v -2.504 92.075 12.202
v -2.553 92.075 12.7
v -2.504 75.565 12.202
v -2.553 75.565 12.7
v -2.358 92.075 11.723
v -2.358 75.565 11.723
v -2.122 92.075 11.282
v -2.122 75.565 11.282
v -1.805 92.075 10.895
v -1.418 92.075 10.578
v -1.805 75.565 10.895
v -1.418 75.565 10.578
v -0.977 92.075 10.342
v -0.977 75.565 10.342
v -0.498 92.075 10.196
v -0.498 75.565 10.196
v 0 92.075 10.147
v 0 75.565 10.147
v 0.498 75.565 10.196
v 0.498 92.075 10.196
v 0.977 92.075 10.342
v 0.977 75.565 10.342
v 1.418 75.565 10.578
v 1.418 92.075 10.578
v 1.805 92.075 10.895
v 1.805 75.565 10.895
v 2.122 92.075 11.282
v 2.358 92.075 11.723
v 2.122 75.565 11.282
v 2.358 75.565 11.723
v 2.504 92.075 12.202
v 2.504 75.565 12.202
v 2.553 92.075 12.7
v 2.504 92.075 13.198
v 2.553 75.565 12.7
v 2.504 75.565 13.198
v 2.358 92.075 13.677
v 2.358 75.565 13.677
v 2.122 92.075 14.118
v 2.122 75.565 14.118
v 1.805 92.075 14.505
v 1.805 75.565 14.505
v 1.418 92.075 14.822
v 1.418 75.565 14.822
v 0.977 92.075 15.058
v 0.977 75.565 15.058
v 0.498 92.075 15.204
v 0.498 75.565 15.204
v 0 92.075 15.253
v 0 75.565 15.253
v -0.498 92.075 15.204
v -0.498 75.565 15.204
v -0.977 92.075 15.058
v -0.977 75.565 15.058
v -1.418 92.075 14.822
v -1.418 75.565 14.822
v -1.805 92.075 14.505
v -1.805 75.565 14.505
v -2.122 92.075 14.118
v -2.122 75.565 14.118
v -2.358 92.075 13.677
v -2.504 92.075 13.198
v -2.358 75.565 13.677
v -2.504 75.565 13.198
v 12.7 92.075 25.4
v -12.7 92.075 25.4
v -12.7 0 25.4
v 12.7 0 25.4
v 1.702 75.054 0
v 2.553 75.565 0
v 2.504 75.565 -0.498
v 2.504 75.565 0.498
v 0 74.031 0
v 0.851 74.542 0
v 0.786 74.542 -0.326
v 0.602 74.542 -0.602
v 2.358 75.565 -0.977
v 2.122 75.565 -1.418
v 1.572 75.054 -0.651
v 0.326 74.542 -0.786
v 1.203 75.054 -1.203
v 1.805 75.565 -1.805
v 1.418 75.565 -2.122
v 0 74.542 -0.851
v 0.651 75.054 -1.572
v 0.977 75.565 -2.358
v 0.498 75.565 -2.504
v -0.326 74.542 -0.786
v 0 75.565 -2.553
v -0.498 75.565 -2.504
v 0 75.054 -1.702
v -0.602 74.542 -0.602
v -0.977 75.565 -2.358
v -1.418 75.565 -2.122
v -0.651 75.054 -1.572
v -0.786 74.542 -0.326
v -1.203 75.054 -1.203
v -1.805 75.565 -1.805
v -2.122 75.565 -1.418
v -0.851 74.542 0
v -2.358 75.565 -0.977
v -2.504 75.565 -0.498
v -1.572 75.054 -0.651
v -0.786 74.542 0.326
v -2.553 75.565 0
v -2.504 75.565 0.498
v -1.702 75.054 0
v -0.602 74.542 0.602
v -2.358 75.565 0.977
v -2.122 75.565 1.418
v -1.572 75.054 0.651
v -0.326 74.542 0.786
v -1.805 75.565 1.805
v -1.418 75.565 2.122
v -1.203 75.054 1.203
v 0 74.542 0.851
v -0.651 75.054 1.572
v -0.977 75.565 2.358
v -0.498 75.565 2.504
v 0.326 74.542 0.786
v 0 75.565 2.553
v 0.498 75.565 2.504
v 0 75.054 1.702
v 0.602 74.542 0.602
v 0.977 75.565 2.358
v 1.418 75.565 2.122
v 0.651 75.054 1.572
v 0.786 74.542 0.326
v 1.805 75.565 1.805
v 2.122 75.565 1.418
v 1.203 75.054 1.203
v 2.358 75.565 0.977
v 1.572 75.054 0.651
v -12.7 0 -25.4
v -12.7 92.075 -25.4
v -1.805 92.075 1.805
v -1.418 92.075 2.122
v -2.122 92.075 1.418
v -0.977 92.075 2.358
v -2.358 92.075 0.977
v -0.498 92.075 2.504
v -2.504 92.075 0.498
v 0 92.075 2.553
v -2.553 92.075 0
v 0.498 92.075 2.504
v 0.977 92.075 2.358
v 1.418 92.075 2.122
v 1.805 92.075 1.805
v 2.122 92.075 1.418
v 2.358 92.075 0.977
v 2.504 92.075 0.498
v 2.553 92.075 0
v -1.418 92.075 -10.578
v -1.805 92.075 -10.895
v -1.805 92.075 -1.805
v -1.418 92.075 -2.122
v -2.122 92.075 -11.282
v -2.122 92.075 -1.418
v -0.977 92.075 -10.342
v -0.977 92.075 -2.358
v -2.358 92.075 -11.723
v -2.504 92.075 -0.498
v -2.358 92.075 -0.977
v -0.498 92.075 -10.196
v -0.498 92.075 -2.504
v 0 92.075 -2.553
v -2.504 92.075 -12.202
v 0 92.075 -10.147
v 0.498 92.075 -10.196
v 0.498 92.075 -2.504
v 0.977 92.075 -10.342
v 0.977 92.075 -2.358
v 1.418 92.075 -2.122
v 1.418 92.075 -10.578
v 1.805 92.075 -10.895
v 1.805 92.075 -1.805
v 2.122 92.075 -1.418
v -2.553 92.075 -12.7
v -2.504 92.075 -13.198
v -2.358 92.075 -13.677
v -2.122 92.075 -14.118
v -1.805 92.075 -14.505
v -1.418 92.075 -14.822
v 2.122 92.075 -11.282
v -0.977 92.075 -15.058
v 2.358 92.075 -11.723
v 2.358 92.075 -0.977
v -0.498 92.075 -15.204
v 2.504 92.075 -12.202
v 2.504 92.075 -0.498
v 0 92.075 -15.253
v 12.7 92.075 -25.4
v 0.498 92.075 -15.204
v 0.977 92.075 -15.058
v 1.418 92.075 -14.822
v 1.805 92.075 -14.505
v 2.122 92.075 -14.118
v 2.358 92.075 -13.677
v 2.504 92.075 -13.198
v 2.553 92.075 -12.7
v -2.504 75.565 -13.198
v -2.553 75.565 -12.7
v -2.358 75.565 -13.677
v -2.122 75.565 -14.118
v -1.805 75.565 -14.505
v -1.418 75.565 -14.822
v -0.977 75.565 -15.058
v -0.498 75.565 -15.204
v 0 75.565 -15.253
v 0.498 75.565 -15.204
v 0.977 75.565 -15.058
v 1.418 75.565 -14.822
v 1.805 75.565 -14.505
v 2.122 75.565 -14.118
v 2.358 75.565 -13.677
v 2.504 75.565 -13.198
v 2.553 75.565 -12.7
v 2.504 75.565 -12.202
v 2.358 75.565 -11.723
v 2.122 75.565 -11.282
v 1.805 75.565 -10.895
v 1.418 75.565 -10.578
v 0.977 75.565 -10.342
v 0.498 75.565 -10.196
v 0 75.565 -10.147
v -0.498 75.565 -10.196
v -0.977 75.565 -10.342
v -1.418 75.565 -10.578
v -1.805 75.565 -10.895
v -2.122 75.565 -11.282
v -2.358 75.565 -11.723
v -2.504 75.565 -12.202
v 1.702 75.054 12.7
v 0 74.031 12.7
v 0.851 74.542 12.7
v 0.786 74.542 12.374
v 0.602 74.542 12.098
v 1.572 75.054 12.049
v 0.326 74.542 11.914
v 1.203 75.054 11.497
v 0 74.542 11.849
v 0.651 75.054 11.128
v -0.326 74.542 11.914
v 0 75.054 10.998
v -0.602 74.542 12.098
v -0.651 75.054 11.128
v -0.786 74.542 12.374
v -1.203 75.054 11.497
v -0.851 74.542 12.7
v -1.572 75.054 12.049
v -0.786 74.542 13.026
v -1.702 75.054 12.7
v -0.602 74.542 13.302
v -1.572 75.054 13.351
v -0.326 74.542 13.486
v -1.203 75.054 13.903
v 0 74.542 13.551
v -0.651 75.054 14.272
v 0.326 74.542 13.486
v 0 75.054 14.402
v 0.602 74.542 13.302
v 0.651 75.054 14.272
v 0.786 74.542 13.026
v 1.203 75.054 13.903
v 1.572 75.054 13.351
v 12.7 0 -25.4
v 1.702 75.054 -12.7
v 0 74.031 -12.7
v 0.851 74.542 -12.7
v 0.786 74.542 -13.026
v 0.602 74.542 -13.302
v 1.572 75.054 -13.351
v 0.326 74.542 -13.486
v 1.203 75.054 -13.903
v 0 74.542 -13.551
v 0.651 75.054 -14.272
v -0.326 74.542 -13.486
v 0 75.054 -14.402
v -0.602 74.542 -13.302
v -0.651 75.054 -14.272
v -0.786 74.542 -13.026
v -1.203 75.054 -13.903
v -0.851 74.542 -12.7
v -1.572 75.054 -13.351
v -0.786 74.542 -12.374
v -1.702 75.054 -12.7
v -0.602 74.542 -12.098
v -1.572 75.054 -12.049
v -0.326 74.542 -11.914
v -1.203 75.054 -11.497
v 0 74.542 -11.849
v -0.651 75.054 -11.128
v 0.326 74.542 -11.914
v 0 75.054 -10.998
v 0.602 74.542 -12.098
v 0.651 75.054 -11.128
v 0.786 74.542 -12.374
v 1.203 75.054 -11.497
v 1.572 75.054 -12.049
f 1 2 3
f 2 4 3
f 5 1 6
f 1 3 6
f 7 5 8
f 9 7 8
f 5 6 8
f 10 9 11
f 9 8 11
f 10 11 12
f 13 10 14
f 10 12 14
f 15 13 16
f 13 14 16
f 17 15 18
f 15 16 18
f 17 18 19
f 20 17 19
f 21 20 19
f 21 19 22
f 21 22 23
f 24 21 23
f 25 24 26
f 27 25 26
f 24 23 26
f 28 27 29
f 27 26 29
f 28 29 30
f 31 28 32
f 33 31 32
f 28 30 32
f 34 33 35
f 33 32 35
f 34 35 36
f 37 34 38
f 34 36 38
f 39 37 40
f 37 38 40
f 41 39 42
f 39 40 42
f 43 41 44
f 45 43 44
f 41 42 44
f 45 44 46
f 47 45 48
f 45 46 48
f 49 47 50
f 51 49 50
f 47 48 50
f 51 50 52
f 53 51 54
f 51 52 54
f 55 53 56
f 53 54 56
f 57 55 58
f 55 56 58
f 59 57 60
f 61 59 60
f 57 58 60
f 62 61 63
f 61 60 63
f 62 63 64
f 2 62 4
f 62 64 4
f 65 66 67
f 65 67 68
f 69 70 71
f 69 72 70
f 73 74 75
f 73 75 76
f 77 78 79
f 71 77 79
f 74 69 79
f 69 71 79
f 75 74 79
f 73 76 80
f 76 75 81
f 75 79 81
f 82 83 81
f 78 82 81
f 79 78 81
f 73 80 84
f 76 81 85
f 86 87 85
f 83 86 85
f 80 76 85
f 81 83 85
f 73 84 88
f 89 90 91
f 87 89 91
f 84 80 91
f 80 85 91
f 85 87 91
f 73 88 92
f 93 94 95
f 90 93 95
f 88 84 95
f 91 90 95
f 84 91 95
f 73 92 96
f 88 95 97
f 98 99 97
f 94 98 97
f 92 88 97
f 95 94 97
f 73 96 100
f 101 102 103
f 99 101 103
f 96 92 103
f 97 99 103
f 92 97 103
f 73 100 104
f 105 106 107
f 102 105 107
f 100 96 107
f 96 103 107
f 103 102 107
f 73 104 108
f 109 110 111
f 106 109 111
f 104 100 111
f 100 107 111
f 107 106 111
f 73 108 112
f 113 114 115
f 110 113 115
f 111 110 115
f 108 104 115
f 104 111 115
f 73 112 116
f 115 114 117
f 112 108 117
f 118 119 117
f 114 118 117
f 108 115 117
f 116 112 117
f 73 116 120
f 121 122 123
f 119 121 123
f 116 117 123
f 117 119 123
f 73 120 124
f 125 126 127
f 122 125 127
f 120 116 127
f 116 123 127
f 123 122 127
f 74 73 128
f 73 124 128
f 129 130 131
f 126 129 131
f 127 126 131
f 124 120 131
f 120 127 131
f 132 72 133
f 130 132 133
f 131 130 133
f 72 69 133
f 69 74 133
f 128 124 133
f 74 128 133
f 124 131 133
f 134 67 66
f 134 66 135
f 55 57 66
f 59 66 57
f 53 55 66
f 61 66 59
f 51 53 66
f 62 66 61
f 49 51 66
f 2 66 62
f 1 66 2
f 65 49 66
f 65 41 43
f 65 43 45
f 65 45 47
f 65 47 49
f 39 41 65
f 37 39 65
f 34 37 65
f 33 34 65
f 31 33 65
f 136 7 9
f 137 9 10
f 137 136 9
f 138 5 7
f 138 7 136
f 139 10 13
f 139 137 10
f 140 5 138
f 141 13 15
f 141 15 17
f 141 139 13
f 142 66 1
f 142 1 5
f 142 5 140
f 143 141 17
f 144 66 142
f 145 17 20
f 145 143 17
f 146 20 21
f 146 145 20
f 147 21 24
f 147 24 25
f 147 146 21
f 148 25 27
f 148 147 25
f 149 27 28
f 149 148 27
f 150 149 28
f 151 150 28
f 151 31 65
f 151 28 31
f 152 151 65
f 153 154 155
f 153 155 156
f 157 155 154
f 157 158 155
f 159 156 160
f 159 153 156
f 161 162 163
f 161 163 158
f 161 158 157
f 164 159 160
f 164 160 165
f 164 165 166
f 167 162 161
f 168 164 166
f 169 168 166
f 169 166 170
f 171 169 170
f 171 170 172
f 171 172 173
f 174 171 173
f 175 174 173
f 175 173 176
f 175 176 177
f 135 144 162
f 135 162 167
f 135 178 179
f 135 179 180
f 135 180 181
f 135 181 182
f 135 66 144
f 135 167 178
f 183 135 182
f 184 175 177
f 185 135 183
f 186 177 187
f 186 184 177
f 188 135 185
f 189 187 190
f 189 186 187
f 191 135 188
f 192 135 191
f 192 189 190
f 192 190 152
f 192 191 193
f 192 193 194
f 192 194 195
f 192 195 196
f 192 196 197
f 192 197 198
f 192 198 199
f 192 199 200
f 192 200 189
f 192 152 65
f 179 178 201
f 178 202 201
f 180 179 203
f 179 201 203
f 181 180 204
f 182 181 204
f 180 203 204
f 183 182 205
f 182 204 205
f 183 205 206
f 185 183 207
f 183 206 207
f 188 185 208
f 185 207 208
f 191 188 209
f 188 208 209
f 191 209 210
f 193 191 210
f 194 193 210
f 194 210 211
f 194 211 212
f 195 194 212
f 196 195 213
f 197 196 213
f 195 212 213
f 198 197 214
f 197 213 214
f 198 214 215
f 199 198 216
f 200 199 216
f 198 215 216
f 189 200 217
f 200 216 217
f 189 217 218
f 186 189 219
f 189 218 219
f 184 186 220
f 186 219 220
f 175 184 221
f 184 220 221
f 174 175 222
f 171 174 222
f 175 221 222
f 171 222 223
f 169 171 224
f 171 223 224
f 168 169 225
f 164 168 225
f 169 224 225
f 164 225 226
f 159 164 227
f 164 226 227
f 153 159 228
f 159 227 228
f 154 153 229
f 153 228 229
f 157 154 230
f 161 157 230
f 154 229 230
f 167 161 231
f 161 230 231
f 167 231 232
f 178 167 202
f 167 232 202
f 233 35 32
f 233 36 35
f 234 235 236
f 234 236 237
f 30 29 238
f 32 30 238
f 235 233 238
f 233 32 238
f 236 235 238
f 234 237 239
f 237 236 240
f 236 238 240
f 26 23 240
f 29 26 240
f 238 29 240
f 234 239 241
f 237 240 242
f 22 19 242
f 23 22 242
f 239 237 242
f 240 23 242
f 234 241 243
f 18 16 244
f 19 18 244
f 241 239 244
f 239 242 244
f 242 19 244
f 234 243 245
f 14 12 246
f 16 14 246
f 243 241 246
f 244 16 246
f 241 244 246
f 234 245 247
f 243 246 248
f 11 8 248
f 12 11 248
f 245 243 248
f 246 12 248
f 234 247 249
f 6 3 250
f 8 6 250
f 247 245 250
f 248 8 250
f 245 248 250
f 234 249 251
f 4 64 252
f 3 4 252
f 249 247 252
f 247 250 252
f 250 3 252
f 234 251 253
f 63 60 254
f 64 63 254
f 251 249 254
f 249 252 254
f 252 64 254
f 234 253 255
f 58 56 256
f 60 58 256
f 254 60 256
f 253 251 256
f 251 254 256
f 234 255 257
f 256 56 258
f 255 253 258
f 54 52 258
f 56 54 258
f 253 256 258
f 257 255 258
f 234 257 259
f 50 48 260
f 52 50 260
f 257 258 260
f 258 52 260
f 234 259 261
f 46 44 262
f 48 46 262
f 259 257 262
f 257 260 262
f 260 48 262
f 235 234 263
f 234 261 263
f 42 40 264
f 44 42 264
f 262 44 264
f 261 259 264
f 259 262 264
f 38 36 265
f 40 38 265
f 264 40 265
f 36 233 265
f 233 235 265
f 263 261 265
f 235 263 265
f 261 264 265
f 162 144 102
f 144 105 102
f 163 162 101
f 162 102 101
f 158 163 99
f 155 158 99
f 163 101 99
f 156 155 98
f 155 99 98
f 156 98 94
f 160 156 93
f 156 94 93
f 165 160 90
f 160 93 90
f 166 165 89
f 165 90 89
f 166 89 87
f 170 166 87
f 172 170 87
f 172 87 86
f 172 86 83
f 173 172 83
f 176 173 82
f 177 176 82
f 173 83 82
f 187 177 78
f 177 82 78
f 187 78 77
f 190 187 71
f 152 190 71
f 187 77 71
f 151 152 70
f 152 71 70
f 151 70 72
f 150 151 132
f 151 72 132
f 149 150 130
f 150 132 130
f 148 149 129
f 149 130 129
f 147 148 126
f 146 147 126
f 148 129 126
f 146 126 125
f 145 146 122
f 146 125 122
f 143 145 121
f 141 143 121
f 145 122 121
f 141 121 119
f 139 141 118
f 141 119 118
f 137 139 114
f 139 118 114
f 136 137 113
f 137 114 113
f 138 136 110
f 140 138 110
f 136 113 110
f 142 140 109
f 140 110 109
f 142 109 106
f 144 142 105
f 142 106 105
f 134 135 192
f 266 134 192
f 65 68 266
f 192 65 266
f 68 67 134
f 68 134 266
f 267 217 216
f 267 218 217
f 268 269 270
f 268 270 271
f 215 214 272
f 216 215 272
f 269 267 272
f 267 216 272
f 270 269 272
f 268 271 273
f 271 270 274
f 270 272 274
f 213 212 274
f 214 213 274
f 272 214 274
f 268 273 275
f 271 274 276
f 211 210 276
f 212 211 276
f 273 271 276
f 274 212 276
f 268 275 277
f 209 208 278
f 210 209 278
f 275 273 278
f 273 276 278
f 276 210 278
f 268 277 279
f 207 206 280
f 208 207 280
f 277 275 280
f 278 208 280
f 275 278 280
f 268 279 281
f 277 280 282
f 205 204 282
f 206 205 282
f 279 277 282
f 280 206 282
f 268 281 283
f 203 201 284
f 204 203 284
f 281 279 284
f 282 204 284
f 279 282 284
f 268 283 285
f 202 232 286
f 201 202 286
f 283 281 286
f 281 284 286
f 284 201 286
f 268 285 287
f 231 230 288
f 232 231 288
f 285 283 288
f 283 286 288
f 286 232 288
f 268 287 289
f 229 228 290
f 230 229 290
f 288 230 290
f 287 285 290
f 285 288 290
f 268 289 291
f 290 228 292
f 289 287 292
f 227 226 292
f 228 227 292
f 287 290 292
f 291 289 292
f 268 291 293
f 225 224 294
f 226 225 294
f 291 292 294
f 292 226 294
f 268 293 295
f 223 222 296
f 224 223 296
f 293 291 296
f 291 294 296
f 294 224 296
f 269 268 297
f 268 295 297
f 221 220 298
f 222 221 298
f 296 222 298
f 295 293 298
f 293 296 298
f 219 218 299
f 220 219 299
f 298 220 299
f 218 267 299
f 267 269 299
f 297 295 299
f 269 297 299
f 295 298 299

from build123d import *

# Parameters (mm, degrees)
SKETCH1_W                   = 25.4
SKETCH1_H                   = 50.8
BOSS_EXTRUDE1_DEPTH         = 92.075
F_1_4_20_TAPPED_HOLE3_D     = 5.1054
F_1_4_20_TAPPED_HOLE3_DEPTH = 16.51
F_1_4_20_TAPPED_HOLE3_TIP   = 1.533816902


with BuildPart() as part:
    # Sketch1 → Boss-Extrude1 (new body)
    with BuildSketch(Plane(origin=(0, 0, 0), x_dir=(1, 0, 0), z_dir=(0, 1, 0))):
        Rectangle(SKETCH1_W, SKETCH1_H)
    extrude(amount=BOSS_EXTRUDE1_DEPTH)

    # 1/4-20 Tapped Hole3
    with Locations(Plane(origin=(0, 92.075, 0), x_dir=(1, 0, 0), z_dir=(0, 1, 0))):
        with Locations((0, 12.7), (0, 0), (0, -12.7)):
            Hole(F_1_4_20_TAPPED_HOLE3_D / 2, depth=F_1_4_20_TAPPED_HOLE3_DEPTH)
            with Locations((0, 0, -(F_1_4_20_TAPPED_HOLE3_DEPTH + F_1_4_20_TAPPED_HOLE3_TIP / 2))):  # 118° drill point
                Cone(0, F_1_4_20_TAPPED_HOLE3_D / 2, F_1_4_20_TAPPED_HOLE3_TIP, mode=Mode.SUBTRACT)


solid = part.part
